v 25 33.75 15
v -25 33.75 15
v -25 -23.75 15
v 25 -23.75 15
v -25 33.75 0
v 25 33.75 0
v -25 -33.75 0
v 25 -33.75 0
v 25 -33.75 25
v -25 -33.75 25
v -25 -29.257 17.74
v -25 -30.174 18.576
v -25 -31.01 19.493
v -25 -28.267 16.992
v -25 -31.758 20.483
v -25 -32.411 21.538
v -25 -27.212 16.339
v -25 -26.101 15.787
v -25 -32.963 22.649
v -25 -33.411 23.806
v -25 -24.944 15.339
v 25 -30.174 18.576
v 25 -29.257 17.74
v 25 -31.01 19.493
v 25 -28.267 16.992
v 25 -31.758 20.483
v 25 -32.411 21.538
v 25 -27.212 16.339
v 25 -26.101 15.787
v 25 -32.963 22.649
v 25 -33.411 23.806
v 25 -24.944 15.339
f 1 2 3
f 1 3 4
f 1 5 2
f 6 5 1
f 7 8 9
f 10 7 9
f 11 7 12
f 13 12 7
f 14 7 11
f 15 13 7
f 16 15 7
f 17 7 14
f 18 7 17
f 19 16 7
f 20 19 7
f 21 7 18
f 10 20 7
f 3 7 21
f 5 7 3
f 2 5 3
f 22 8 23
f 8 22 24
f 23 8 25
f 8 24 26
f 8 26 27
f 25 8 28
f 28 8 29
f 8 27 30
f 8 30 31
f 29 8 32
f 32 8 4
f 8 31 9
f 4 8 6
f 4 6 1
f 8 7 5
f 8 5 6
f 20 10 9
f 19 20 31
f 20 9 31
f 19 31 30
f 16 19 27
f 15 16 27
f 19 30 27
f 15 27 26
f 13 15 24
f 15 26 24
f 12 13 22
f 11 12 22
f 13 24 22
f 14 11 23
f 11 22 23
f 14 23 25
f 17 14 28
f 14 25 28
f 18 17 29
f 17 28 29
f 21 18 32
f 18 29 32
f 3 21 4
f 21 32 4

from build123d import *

# Parameters (mm, degrees)
SKETCH_1_W      = 50
SKETCH_1_H      = 67.5
EXTRUDE_1_DEPTH = 15
EXTRUDE_2_DEPTH = 50


with BuildPart() as part:
    # 草图1 → 凸台-拉伸1 (new body)
    with BuildSketch(Plane.XY):
        Rectangle(SKETCH_1_W, SKETCH_1_H)
    extrude(amount=EXTRUDE_1_DEPTH)

    # 草图5 → 凸台-拉伸2 (add)
    with BuildSketch(Plane(origin=(25, 0, 0), x_dir=(0, 0, -1), z_dir=(1, 0, 0))):
        with BuildLine():
            Line((-15, -33.75), (-25, -33.75))
            ThreePointArc((-25, -33.75), (-18.575918968, -30.174081032), (-15, -23.75))
            Line((-15, -23.75), (-15, -33.75))
        make_face()
    extrude(amount=-EXTRUDE_2_DEPTH)


solid = part.part
